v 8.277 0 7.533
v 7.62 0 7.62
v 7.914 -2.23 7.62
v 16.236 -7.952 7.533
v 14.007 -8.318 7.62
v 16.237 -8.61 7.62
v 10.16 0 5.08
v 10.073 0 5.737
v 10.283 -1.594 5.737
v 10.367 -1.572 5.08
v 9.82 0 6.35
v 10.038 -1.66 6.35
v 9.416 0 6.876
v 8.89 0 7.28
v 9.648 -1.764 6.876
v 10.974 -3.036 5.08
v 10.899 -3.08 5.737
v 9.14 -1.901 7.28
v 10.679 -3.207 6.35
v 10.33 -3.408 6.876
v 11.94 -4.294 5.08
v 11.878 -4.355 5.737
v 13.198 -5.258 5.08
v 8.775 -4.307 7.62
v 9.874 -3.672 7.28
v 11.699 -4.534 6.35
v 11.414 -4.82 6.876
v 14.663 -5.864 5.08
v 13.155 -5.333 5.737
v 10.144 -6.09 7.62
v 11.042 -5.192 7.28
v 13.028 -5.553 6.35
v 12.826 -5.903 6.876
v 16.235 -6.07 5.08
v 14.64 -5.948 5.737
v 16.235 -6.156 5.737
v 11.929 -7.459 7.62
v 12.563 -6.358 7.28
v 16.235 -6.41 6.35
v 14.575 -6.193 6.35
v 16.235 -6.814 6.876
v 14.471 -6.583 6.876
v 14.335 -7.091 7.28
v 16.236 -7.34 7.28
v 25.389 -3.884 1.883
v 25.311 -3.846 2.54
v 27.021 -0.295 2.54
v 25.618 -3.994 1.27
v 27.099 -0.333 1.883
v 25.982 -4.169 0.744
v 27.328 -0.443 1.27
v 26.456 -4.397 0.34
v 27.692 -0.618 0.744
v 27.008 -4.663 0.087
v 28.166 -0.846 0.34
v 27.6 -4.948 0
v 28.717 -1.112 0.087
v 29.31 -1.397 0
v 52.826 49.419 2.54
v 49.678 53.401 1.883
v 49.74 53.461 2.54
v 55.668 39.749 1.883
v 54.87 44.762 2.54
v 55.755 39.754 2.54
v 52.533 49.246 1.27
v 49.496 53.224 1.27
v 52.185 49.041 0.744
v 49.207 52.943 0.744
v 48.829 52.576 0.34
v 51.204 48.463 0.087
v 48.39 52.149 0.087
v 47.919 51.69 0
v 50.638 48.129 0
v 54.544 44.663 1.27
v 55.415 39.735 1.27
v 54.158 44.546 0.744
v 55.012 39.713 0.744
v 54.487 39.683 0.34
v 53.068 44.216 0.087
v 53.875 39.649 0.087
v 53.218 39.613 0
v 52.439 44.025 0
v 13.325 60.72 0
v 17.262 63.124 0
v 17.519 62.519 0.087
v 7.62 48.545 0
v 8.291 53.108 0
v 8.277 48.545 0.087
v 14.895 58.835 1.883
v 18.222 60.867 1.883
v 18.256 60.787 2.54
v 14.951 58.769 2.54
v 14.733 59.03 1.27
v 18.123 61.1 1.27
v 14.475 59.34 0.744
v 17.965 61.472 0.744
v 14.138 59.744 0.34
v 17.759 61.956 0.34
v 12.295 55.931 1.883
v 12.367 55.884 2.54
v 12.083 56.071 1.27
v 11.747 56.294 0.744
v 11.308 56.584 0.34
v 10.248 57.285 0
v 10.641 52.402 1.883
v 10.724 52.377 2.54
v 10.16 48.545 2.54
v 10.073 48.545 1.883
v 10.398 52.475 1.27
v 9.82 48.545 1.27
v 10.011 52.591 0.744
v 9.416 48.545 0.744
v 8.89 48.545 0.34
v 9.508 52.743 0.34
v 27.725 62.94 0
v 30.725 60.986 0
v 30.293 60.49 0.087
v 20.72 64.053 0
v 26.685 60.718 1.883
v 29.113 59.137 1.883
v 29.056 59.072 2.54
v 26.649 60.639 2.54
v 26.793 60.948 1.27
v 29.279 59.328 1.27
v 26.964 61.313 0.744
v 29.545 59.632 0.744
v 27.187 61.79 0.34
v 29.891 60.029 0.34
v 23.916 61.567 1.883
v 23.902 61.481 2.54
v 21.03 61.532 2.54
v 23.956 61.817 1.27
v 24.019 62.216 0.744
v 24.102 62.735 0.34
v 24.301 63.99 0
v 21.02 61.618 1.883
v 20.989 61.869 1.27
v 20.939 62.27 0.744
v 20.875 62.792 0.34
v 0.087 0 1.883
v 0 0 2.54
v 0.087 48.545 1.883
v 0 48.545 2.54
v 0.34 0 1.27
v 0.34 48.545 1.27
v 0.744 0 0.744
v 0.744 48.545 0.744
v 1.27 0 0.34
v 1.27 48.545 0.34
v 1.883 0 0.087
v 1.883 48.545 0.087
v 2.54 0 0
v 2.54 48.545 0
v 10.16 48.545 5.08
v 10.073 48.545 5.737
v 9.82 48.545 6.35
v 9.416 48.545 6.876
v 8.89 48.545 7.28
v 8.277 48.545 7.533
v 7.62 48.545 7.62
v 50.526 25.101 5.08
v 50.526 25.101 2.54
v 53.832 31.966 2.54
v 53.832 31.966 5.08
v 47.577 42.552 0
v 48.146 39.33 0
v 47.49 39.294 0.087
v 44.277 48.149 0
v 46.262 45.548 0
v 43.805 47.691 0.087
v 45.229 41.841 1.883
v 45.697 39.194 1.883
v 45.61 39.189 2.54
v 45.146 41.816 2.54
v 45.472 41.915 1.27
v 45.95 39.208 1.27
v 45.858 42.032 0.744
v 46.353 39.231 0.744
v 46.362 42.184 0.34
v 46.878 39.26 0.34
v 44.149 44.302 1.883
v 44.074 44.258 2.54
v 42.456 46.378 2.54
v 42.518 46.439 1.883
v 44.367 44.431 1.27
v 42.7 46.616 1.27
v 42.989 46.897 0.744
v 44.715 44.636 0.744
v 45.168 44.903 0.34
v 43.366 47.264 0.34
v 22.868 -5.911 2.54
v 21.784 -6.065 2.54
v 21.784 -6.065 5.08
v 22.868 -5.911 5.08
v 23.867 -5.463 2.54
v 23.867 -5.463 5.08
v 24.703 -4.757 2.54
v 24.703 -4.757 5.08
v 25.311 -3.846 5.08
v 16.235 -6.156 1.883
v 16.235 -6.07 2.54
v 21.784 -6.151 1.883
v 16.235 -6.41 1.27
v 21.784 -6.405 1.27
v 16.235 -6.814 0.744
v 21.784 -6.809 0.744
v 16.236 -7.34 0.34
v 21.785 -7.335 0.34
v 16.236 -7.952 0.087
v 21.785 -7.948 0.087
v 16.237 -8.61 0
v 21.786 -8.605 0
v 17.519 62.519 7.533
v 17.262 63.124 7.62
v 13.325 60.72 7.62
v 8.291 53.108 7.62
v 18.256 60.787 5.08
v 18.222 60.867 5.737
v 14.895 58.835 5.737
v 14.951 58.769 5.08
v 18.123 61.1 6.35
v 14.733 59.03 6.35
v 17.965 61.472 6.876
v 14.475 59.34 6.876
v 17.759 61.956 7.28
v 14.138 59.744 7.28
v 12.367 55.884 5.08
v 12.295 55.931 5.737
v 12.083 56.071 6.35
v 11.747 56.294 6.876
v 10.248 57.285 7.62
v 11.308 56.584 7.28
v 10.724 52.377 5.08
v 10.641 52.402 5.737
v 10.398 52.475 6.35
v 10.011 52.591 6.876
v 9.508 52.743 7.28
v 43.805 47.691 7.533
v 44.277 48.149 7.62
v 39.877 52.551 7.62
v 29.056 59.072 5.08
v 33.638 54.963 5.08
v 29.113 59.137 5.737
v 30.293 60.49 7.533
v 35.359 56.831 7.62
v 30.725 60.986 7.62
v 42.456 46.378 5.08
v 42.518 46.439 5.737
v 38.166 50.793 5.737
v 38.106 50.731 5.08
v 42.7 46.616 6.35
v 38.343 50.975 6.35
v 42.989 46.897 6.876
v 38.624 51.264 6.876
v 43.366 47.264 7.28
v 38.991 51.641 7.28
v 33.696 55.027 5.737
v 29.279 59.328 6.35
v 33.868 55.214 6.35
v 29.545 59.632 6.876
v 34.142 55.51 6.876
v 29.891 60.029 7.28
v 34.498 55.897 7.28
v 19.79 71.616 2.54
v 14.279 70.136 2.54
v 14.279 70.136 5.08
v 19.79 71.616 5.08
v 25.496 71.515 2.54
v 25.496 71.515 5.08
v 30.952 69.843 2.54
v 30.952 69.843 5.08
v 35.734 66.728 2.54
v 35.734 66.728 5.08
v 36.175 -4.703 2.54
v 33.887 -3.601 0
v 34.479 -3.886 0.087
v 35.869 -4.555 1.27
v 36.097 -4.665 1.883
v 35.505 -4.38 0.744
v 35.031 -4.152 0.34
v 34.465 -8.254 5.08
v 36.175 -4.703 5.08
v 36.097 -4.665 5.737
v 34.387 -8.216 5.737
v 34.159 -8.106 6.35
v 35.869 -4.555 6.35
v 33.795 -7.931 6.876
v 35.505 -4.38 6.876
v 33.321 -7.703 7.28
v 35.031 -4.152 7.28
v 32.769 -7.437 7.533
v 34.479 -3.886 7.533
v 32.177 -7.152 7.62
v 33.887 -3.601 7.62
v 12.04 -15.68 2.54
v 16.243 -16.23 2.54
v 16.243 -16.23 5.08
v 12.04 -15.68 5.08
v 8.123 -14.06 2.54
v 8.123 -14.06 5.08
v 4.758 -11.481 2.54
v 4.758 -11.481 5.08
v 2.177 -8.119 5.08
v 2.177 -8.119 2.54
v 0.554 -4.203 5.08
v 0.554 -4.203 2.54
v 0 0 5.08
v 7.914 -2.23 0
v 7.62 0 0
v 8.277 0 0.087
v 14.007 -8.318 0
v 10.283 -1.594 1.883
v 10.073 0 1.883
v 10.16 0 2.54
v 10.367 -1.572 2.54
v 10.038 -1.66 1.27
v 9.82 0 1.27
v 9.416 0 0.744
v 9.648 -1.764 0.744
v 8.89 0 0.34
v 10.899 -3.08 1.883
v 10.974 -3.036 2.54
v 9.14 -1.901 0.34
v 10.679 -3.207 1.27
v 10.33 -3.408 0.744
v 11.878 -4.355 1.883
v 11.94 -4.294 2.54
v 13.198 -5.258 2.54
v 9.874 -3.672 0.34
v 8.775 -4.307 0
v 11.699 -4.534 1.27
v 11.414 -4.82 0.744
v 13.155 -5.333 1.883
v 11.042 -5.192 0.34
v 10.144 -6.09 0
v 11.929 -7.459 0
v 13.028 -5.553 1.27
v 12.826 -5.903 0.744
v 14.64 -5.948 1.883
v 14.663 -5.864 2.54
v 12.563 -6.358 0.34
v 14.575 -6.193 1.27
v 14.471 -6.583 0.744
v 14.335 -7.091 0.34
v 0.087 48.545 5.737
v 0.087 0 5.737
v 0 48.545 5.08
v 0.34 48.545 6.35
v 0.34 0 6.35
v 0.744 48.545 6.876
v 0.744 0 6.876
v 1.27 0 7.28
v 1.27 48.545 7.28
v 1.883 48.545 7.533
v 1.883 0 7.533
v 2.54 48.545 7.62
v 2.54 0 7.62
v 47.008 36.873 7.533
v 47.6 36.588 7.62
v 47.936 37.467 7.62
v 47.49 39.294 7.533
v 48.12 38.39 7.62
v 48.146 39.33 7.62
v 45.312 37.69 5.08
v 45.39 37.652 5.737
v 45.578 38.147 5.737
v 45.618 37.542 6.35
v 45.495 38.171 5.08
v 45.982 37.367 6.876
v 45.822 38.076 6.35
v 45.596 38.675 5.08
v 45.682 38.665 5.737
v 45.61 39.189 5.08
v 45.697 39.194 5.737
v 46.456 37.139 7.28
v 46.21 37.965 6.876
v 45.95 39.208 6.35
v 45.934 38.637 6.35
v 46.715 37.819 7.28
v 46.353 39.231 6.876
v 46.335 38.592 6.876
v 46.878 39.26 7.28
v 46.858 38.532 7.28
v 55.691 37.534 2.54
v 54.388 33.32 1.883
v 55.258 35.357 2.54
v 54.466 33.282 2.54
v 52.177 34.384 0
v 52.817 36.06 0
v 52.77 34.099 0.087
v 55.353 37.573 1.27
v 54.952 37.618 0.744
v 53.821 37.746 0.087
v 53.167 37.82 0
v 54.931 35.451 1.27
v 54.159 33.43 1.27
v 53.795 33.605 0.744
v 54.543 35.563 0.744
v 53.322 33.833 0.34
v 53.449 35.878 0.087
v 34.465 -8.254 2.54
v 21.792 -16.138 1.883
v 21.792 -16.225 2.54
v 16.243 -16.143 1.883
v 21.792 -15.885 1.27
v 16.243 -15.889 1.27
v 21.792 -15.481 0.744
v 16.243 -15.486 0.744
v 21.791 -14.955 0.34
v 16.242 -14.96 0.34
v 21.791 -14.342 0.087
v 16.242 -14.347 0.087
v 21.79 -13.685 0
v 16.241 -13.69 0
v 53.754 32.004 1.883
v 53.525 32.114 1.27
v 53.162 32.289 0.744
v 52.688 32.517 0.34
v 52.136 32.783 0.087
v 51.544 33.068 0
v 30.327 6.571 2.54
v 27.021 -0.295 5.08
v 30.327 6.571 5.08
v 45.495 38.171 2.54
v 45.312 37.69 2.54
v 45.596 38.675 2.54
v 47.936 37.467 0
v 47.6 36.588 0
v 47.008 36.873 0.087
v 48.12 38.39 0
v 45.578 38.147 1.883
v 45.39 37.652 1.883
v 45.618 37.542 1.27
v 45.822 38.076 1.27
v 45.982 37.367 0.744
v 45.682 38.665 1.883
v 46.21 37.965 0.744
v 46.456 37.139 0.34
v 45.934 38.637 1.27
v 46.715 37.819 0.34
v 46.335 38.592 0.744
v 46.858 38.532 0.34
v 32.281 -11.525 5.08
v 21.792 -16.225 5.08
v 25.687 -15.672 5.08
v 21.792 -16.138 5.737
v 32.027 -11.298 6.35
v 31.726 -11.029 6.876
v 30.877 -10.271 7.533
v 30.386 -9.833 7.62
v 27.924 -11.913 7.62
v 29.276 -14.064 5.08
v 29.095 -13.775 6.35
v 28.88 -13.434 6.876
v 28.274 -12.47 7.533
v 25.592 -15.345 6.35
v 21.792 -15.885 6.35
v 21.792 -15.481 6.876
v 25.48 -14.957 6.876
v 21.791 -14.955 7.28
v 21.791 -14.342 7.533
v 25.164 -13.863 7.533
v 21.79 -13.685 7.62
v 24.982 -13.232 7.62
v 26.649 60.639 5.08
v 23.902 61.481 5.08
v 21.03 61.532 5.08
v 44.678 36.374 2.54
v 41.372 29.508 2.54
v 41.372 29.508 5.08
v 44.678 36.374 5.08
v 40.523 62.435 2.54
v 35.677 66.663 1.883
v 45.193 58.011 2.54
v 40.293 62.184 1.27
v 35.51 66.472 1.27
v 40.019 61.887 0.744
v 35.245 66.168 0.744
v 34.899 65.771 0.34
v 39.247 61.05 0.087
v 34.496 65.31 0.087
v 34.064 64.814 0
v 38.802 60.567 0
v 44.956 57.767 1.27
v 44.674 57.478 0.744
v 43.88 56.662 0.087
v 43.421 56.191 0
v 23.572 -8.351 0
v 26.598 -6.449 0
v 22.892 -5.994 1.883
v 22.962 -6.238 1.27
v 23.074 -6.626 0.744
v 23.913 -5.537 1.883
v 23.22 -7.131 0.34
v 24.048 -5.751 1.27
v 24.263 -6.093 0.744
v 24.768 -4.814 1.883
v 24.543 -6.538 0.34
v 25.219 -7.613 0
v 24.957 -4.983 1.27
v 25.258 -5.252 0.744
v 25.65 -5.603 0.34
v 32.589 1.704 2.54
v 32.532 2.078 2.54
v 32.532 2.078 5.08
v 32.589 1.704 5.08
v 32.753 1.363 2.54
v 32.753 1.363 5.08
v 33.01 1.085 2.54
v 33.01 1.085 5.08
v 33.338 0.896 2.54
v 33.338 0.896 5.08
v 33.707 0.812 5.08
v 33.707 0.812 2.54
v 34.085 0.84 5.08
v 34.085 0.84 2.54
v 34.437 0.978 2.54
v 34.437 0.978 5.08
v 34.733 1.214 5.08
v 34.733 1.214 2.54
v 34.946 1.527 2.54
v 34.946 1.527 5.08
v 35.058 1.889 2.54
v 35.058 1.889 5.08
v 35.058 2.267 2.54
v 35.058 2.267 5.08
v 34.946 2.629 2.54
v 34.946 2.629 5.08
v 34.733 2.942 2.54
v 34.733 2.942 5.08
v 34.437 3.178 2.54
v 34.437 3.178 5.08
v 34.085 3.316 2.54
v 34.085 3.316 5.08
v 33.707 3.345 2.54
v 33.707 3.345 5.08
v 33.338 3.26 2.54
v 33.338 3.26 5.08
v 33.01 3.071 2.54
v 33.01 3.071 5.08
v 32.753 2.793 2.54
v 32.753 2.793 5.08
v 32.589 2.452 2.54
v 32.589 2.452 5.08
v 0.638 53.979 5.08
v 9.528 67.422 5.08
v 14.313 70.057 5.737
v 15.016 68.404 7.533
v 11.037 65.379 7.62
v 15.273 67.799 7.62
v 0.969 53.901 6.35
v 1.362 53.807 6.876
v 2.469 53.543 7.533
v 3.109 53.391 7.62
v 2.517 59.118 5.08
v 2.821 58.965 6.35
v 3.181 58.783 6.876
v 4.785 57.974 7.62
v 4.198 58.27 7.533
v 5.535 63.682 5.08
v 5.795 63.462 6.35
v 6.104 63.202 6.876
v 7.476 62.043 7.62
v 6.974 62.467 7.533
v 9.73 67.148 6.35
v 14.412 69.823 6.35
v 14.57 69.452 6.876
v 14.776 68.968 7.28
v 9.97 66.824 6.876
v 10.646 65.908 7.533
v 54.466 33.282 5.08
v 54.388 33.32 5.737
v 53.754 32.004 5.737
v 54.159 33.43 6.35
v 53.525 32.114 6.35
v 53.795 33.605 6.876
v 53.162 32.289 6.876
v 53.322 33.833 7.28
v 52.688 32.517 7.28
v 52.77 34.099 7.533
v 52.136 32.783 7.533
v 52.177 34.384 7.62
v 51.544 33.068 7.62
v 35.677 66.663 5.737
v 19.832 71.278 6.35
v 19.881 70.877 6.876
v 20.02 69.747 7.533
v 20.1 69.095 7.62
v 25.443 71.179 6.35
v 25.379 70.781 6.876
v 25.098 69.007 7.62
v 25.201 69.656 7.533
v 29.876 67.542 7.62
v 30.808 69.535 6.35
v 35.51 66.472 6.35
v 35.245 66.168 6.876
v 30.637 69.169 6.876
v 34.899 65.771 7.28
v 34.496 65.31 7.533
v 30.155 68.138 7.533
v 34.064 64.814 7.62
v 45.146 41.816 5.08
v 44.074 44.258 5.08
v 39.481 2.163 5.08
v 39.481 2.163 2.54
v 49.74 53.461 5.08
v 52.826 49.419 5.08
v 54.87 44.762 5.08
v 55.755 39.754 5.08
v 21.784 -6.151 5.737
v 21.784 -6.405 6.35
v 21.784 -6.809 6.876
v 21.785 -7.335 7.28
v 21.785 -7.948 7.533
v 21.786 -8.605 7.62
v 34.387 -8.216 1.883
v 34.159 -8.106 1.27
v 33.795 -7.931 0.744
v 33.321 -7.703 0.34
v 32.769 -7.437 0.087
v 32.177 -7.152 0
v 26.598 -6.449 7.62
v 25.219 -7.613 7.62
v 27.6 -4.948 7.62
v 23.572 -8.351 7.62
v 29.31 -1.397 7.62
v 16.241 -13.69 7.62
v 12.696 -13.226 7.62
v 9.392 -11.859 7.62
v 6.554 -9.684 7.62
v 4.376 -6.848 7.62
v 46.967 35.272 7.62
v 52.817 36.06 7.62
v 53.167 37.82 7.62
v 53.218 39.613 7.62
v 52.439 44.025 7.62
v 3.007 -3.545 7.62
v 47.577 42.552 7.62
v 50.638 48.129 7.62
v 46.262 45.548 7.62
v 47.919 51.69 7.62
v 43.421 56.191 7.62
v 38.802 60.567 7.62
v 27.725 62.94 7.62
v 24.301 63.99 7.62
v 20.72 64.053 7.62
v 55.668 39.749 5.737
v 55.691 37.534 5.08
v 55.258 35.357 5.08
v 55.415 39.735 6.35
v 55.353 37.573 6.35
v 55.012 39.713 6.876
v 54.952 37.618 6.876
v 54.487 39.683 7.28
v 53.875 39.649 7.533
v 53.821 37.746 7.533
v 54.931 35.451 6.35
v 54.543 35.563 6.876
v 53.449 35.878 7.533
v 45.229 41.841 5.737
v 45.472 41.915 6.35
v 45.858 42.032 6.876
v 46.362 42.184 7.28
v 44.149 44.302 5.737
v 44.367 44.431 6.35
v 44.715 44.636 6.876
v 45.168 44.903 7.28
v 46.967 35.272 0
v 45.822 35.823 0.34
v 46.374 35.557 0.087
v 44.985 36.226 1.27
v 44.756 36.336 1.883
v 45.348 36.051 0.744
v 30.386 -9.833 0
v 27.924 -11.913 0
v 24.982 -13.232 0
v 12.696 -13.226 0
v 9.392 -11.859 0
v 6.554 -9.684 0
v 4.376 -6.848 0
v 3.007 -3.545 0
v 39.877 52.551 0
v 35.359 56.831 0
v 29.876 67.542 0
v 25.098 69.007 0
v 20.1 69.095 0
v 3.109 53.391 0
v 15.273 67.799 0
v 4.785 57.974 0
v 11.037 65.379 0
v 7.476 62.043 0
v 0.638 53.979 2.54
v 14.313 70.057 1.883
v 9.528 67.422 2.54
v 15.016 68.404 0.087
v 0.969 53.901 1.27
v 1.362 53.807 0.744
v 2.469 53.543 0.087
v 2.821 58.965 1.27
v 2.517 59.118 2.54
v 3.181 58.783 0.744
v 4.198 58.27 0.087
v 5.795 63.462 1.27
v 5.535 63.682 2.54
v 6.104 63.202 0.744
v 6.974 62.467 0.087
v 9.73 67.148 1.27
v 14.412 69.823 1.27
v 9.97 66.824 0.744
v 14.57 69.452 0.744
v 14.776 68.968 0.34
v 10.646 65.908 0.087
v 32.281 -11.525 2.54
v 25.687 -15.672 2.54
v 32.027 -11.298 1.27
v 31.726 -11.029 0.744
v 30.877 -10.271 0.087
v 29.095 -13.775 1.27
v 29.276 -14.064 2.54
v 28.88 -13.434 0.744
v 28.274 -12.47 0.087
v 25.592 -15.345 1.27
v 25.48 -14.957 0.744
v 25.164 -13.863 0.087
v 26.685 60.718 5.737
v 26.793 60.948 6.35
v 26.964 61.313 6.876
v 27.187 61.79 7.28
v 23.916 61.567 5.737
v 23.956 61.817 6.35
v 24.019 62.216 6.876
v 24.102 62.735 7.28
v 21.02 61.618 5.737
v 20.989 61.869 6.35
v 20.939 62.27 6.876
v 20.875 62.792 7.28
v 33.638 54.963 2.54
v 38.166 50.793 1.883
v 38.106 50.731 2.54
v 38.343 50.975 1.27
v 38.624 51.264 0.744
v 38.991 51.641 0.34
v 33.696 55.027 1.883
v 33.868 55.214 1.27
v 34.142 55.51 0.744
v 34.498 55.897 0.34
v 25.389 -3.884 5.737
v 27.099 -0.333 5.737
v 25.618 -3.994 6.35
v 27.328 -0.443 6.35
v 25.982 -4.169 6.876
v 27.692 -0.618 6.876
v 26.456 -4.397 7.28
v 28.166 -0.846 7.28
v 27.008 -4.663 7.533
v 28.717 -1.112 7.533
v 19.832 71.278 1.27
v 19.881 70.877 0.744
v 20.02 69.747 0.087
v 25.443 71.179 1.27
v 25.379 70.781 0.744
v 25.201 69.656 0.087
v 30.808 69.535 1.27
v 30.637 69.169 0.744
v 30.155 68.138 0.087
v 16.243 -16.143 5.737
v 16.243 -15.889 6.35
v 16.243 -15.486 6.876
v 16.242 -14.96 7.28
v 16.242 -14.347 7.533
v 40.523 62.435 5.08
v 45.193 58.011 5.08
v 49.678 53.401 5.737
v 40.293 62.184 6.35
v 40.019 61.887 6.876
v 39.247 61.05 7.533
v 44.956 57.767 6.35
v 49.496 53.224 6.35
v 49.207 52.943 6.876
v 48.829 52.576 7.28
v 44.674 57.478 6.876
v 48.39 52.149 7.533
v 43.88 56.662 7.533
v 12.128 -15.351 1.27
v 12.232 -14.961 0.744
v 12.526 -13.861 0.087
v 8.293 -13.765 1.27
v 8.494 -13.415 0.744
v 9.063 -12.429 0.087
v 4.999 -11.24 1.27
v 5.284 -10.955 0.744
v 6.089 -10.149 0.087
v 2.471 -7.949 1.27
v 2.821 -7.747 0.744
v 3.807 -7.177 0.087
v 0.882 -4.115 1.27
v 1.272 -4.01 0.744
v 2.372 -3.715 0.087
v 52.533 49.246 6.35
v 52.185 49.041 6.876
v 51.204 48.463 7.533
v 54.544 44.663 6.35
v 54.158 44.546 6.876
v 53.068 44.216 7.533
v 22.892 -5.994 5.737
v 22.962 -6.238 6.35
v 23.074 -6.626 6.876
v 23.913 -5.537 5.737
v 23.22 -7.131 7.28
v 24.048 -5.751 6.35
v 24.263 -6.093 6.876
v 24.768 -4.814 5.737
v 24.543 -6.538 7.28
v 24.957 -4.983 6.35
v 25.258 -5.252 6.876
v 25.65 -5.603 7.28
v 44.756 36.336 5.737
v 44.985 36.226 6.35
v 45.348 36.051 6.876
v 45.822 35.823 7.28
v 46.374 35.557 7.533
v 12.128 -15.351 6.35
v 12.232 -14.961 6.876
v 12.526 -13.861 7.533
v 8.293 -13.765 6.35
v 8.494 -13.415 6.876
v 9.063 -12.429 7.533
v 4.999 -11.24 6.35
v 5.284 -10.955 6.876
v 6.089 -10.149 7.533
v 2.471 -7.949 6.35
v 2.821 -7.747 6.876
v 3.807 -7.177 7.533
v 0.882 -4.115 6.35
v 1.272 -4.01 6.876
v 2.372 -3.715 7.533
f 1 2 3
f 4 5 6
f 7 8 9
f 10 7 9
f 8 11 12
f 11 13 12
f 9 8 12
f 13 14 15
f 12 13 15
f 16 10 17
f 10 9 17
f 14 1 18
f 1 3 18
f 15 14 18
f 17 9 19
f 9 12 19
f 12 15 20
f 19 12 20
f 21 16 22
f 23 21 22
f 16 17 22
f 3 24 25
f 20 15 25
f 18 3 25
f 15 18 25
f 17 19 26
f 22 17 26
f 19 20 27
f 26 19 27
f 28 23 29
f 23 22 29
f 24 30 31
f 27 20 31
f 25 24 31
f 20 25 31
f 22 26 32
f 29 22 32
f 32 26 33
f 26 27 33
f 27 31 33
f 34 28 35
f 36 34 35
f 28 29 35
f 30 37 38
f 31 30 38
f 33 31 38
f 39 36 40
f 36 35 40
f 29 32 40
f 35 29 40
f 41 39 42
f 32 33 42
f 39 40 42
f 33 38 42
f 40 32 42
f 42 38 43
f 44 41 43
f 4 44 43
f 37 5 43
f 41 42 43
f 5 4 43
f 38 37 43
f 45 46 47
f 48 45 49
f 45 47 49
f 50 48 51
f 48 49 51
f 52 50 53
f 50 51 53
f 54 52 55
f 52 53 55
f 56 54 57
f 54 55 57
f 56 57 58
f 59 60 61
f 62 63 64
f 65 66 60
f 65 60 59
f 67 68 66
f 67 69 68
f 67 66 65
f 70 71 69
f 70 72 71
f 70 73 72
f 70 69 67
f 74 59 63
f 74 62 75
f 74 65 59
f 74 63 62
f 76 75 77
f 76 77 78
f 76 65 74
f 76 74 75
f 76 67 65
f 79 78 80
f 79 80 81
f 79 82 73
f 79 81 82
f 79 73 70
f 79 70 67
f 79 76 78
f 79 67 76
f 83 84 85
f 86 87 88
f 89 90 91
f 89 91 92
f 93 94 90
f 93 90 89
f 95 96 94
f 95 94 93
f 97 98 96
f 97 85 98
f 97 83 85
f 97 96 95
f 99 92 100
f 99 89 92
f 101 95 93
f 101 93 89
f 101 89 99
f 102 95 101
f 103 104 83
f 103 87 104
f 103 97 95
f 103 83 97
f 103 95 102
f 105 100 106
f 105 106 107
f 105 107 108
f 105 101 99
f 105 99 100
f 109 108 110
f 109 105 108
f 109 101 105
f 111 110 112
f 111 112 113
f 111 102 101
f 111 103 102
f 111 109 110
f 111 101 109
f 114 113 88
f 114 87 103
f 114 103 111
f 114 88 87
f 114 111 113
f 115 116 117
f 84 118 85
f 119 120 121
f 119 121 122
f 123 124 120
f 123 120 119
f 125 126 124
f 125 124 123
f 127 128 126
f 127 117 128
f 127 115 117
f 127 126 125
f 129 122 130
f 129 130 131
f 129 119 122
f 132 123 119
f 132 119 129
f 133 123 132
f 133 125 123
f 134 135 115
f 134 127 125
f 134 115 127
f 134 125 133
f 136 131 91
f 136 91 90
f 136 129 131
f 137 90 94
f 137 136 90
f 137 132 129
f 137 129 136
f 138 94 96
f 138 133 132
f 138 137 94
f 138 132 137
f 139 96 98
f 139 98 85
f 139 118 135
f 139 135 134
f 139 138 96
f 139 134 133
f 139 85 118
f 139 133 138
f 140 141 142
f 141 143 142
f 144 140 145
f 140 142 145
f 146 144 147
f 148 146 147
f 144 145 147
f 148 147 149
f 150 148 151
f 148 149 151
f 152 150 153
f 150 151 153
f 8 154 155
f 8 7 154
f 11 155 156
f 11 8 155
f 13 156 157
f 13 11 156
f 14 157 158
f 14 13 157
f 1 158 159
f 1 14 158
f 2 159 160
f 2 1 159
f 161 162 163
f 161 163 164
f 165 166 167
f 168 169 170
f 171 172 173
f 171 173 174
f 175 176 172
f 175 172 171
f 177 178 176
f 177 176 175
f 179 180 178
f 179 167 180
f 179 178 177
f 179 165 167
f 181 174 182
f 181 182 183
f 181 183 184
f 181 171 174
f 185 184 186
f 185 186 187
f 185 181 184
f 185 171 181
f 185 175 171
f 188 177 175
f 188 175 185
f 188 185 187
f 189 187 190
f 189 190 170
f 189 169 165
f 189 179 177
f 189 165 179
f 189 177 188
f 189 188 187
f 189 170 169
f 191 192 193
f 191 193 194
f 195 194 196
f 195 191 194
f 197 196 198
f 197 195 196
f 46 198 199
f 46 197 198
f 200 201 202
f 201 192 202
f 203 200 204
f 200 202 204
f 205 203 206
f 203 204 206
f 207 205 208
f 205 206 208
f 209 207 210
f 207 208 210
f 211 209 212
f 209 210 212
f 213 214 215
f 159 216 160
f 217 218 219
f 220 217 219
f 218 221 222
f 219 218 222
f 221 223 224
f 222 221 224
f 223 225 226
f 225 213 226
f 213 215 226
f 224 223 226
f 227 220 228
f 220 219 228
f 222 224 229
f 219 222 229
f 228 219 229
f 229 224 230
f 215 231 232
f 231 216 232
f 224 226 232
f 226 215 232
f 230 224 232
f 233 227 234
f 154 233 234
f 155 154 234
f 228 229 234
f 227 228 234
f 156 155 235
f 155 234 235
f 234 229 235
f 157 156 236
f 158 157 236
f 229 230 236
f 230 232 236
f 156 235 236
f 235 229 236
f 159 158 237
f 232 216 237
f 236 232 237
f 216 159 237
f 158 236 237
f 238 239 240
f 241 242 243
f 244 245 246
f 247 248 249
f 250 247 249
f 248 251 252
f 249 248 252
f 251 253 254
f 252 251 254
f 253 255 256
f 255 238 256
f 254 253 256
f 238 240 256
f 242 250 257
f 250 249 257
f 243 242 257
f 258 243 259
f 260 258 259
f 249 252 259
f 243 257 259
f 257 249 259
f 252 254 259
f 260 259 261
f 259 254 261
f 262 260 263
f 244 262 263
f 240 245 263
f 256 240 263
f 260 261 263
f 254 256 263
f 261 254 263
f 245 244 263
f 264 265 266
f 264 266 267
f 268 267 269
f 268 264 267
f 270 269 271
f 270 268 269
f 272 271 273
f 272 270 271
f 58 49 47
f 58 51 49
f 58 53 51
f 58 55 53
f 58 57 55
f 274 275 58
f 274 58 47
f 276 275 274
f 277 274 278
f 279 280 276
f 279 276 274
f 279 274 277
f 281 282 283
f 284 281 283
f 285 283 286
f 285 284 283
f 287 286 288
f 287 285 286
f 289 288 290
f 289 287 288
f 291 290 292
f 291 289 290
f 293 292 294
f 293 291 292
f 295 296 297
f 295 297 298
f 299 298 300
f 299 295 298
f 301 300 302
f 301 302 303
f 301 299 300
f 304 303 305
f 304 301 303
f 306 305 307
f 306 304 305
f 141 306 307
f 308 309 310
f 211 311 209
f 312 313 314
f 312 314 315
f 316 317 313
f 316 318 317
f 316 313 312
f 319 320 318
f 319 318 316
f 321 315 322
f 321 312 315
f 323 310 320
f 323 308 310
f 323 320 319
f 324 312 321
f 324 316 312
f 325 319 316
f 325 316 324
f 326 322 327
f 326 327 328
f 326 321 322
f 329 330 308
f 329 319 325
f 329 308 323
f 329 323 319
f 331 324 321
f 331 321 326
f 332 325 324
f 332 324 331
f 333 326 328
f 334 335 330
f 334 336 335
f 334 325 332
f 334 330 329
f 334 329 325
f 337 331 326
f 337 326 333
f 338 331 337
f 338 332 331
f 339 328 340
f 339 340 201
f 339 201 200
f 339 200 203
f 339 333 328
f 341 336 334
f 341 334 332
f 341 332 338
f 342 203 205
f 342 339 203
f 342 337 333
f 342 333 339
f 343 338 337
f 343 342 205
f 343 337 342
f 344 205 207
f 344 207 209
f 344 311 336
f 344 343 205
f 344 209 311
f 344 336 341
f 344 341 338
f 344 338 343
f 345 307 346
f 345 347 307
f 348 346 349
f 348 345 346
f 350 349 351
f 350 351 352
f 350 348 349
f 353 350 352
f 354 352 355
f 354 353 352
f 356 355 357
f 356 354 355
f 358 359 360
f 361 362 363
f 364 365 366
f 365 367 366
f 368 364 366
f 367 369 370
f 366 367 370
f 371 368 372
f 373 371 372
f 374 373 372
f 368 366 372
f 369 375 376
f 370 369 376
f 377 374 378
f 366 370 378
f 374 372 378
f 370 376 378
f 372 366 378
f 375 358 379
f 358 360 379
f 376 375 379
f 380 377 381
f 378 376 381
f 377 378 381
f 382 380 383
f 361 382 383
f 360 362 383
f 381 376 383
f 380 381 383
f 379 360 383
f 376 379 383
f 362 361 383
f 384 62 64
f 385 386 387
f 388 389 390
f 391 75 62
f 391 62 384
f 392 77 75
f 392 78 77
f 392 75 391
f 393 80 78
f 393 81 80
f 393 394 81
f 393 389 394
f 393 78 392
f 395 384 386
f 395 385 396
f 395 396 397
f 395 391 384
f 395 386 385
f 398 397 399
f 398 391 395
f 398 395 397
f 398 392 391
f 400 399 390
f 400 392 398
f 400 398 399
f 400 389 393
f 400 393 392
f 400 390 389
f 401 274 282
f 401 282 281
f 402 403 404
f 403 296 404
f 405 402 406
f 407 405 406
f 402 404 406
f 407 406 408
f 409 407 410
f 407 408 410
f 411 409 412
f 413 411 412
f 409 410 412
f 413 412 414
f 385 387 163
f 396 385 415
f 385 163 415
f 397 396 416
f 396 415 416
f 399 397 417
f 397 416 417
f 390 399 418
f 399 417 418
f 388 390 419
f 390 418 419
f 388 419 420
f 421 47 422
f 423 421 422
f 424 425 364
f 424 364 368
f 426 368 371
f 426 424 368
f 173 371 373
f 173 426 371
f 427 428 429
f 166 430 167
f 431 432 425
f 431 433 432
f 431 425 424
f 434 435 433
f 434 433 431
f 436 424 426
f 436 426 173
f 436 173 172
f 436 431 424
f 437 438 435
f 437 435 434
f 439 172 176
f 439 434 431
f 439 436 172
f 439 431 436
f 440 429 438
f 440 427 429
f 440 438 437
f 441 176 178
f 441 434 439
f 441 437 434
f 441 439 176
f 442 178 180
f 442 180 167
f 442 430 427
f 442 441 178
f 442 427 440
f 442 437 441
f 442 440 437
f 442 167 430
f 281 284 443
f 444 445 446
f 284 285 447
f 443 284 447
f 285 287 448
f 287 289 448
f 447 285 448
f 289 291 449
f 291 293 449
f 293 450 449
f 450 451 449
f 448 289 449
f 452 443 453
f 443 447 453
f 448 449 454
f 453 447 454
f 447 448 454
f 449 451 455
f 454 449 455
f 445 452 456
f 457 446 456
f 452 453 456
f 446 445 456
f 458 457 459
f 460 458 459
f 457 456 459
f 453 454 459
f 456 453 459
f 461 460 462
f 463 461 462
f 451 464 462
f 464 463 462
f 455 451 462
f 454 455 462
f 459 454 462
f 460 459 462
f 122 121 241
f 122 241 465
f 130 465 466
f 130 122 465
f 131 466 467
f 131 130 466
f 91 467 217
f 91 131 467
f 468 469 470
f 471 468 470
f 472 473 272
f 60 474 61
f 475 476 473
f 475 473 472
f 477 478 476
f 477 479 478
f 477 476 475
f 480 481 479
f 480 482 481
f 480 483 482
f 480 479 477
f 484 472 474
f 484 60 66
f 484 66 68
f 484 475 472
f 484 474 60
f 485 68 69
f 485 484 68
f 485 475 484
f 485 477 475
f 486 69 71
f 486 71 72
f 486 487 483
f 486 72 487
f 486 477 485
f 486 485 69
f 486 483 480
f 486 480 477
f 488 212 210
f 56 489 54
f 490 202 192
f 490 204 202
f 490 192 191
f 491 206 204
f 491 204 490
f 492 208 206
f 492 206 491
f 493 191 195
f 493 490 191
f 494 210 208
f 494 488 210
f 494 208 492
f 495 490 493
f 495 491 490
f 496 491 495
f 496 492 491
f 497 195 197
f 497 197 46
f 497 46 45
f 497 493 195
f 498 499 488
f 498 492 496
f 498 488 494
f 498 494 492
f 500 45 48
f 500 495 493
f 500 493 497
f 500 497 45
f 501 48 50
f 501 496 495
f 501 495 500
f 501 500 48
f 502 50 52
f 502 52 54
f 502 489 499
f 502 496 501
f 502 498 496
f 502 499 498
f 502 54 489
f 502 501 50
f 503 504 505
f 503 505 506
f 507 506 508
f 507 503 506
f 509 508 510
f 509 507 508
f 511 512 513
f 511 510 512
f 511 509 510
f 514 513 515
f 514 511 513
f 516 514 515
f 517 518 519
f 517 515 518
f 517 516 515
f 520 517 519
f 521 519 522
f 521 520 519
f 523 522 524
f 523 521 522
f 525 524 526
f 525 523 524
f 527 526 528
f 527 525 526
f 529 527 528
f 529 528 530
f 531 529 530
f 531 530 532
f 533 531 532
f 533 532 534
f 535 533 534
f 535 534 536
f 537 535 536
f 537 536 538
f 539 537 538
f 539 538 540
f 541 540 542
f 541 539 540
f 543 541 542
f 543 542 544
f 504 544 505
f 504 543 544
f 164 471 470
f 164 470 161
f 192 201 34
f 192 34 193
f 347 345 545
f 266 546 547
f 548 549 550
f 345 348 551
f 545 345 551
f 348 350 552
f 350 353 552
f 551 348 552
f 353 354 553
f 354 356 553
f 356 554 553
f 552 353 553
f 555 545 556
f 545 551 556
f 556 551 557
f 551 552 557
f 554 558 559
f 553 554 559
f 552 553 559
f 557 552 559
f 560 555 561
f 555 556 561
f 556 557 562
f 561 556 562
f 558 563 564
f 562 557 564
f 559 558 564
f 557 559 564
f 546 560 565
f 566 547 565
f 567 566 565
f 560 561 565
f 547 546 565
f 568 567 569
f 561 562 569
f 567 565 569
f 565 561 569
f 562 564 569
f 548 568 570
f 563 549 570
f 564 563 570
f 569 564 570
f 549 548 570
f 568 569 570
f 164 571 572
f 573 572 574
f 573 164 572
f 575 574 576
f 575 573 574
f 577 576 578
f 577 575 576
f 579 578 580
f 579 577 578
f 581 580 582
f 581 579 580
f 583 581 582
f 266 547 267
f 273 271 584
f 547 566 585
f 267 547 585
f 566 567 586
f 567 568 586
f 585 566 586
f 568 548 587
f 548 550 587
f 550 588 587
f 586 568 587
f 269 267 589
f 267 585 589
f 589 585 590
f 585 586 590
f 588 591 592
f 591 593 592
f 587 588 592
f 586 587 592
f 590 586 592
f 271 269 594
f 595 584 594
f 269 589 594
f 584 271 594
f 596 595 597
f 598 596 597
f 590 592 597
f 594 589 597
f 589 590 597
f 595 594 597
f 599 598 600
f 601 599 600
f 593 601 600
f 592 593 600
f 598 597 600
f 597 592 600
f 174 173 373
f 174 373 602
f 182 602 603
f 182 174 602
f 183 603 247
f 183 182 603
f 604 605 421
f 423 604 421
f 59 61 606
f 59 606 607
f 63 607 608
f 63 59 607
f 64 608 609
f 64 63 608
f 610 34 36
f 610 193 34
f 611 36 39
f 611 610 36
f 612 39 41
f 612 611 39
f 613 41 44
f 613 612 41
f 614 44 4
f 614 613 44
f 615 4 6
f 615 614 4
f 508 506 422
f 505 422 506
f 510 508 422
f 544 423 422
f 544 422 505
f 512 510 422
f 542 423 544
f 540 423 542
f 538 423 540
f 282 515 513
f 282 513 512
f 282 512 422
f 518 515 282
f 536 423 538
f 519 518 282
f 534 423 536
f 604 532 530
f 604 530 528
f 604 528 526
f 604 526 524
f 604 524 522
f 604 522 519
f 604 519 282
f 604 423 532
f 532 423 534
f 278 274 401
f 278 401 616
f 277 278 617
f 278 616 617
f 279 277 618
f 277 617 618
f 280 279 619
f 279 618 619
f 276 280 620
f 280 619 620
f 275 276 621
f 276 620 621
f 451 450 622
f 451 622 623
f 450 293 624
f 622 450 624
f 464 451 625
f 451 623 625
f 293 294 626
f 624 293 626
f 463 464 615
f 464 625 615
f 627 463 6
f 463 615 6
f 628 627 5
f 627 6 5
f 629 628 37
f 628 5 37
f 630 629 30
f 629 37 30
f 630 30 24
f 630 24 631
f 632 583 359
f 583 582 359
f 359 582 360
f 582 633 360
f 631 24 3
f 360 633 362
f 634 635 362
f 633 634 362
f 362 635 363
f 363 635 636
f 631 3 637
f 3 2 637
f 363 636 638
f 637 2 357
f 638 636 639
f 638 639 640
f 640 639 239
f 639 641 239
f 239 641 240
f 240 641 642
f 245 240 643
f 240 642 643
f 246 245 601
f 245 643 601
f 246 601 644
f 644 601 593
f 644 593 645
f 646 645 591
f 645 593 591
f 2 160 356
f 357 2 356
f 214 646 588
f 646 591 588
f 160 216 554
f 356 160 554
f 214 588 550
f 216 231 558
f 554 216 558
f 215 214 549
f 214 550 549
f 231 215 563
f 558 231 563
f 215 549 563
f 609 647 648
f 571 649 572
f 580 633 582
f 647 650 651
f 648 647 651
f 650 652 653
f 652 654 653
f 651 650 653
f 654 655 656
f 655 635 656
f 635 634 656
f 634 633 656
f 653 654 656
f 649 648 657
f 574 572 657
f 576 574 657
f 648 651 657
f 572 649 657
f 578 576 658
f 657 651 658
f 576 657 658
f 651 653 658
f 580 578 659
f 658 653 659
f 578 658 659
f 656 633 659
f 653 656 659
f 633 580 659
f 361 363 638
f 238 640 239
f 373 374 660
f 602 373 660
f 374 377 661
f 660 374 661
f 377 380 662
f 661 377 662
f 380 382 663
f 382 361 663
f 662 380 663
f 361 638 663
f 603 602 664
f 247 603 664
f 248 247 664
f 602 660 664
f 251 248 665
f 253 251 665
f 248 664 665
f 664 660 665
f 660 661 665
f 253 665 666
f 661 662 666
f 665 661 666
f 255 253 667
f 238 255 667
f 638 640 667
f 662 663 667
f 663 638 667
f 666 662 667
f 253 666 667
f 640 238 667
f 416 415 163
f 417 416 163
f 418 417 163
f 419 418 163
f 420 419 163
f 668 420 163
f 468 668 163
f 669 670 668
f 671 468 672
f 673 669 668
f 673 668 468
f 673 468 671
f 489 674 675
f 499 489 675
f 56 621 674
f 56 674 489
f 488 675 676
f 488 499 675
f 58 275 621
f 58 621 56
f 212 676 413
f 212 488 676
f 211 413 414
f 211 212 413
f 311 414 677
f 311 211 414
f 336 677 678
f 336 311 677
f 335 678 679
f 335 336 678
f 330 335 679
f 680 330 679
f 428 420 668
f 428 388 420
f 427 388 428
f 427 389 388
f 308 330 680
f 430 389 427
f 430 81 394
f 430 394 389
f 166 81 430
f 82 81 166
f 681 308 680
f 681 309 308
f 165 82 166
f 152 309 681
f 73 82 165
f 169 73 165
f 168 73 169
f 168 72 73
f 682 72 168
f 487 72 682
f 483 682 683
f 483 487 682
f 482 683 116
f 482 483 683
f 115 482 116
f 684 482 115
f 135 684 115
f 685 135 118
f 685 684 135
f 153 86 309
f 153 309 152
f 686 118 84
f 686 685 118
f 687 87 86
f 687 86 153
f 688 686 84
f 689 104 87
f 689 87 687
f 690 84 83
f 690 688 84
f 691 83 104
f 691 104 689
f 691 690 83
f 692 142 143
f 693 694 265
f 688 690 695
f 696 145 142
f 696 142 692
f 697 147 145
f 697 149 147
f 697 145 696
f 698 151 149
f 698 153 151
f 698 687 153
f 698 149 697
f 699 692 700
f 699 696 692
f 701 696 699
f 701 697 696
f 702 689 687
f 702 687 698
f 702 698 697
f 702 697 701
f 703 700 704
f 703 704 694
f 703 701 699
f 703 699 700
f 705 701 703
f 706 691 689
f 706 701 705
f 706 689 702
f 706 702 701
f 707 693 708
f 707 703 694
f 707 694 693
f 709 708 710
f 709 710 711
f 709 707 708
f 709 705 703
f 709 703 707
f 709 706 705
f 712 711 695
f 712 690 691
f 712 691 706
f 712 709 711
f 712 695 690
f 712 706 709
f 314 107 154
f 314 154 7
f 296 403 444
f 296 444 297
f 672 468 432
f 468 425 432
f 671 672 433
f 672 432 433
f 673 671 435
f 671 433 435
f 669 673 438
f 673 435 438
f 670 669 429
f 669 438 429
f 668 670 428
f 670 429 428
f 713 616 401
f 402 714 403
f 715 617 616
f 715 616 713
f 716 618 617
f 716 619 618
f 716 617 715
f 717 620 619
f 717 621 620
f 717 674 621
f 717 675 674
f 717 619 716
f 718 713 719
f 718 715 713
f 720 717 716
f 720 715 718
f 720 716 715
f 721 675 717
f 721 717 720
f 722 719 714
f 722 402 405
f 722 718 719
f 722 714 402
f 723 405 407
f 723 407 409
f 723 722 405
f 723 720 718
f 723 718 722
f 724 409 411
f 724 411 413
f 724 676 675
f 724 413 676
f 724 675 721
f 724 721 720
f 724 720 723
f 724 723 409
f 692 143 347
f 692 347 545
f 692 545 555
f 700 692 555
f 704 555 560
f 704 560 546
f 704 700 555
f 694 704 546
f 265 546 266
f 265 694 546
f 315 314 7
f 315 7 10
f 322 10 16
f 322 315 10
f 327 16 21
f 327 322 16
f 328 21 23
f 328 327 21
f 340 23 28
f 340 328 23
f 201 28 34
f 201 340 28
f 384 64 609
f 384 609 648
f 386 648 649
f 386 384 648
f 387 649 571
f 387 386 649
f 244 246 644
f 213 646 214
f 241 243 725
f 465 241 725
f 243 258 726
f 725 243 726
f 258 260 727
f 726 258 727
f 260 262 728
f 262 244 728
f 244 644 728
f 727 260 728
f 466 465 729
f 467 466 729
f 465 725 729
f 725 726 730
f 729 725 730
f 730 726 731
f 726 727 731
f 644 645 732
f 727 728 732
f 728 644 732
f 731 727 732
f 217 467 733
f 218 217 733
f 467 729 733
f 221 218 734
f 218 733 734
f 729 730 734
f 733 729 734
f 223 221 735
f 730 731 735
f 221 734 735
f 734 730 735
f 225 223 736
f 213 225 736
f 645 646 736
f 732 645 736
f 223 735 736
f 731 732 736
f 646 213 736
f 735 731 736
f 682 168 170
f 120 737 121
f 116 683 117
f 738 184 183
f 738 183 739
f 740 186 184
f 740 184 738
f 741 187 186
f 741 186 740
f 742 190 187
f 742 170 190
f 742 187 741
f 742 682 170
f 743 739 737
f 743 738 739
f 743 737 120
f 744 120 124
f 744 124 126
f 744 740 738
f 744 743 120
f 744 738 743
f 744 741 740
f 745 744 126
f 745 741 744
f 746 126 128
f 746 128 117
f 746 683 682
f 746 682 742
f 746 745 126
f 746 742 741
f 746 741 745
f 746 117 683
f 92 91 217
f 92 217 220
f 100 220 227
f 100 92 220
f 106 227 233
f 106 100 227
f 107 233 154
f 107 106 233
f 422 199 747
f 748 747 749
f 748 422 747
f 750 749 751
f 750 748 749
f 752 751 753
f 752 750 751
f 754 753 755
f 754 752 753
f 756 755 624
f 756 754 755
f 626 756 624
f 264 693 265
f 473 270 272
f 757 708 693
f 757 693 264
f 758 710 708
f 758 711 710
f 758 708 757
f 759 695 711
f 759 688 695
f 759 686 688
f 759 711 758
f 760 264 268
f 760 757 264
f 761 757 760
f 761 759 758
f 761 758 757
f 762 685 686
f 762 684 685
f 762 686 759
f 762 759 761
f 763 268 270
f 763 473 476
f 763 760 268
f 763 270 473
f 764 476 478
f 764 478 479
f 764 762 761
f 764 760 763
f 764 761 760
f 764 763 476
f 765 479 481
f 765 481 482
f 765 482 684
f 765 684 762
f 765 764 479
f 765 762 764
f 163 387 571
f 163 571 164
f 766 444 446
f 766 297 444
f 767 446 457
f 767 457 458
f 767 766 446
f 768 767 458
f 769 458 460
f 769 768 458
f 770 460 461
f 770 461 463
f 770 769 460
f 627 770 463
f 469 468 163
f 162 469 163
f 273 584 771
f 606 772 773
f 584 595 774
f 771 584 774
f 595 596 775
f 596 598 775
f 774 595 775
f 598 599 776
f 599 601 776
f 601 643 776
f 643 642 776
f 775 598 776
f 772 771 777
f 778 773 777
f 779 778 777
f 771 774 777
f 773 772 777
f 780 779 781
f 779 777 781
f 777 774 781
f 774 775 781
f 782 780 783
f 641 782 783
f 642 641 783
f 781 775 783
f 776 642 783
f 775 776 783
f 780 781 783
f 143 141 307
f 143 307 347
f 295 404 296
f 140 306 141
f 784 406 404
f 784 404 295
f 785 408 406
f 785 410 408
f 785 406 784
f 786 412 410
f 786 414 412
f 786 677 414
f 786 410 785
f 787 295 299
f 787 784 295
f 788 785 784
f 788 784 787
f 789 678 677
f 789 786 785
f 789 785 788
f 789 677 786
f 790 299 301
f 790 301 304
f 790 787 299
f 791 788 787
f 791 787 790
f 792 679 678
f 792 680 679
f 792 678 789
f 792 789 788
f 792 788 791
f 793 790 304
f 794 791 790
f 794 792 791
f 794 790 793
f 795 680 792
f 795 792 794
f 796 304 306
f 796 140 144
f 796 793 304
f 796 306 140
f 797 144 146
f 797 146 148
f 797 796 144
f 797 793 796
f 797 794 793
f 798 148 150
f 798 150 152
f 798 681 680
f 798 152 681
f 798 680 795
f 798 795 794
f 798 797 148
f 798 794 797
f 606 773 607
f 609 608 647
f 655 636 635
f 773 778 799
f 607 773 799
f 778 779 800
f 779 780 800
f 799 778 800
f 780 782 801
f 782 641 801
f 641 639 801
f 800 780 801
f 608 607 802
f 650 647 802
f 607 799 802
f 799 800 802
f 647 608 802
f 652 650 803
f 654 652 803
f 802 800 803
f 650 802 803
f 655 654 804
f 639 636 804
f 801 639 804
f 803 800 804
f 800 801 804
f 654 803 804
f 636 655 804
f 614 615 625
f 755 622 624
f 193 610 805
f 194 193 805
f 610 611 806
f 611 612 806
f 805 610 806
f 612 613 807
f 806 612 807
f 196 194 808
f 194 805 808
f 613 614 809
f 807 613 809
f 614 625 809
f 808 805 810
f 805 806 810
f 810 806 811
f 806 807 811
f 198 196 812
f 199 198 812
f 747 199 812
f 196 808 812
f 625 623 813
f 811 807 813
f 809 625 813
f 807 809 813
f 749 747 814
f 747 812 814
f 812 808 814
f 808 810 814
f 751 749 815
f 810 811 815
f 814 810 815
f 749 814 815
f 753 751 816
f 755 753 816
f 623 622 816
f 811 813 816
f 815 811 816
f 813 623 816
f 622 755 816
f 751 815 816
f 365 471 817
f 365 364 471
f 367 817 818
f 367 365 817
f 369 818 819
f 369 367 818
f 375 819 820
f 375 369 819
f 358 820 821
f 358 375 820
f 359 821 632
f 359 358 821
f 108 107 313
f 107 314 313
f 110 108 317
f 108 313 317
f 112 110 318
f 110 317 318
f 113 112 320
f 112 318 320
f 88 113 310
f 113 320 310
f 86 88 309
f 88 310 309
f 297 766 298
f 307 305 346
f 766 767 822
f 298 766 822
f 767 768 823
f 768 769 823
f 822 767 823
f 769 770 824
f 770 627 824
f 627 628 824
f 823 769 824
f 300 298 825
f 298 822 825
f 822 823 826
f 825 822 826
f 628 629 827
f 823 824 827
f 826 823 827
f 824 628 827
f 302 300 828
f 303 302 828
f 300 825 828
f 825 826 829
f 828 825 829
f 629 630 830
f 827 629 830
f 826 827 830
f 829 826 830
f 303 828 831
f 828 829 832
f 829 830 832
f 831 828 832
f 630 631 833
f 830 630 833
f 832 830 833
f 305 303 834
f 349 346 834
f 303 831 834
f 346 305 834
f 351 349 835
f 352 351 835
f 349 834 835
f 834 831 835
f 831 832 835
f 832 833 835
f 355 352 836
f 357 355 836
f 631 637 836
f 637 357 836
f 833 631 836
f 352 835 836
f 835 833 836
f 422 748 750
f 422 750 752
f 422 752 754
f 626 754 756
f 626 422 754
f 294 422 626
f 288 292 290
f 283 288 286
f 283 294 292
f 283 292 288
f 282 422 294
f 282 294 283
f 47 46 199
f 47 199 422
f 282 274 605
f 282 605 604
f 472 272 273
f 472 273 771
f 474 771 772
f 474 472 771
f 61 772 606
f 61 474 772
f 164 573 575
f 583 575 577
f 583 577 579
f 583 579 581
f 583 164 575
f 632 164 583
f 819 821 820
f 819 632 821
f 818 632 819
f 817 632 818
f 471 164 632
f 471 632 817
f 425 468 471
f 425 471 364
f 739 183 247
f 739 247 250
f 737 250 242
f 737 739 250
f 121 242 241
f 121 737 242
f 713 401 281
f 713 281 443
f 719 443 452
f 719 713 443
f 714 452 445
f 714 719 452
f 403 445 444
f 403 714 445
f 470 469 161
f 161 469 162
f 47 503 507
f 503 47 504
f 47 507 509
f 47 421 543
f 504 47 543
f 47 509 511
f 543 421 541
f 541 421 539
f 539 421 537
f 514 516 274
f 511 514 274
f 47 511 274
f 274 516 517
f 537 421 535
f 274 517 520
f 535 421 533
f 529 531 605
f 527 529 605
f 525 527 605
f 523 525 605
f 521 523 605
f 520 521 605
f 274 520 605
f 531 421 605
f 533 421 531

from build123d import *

# Parameters (mm, degrees)
BOSS_EXTRUDE1_DEPTH     = 7.62
FILLET1_R               = 2.54
SKETCH4_W               = 10.16
SKETCH4_H               = 2.54
BOSS_EXTRUDE2_DEPTH     = 40.698655059
CUT_EXTRUDE1_DEPTH      = 92.035139481
CUT_EXTRUDE1_DEPTH_BACK = 92.035139481
SKETCH7_R               = 1.27
CUT_EXTRUDE2_DEPTH      = 92.212140759


with BuildPart() as part:
    # Sketch2 → Boss-Extrude1 (new body)
    with BuildSketch(Plane.XY):
        with BuildLine():
            Line((557.368573337, 914.592873905), (556.734884655, 913.276848696))
            Line((556.734884655, 913.276848696), (547.580835245, 917.684680294))
            Line((547.580835245, 917.684680294), (548.214523926, 919.000705503))
            ThreePointArc((548.214523926, 919.000705503), (548.458818056, 919.731374997), (548.513066645, 920.499889552))
            ThreePointArc((548.513066645, 920.499889552), (547.585939227, 924.379743345), (545.358485968, 927.689015574))
            ThreePointArc((545.358485968, 927.689015574), (538.788952643, 934.173311823), (531.958551893, 940.382216038))
            ThreePointArc((531.958551893, 940.382216038), (526.80512603, 942.791823737), (521.15870091, 942.097640216))
            ThreePointArc((521.15870091, 942.097640216), (515.269866914, 937.194322522), (513.062812413, 929.85608018))
            Line((513.062812413, 929.85608018), (513.062812413, 881.310664403))
            ThreePointArc((513.062812413, 881.310664403), (514.84238247, 877.01697918), (519.13757646, 875.241053792))
            Line((519.13757646, 875.241053792), (524.686345009, 875.245763006))
            ThreePointArc((524.686345009, 875.245763006), (526.769666342, 875.847420281), (528.214212618, 877.464672677))
            Line((528.214212618, 877.464672677), (529.924061844, 881.015635083))
            Line((529.924061844, 881.015635083), (539.078111254, 876.607803485))
            Line((539.078111254, 876.607803485), (537.368262028, 873.056841079))
            ThreePointArc((537.368262028, 873.056841079), (532.178962974, 867.247123196), (524.69496775, 865.085766665))
            Line((524.69496775, 865.085766665), (519.146199201, 865.081057451))
            ThreePointArc((519.146199201, 865.081057451), (507.66122682, 869.82972633), (502.902812413, 881.310664403))
            Line((502.902812413, 881.310664403), (502.902812413, 929.85608018))
            ThreePointArc((502.902812413, 929.85608018), (506.79547726, 942.798813577), (517.181834766, 951.446978999))
            ThreePointArc((517.181834766, 951.446978999), (528.398937465, 952.826033478), (538.636655301, 948.039143286))
            ThreePointArc((538.636655301, 948.039143286), (545.776010677, 941.549396152), (552.642698999, 934.771800374))
            ThreePointArc((552.642698999, 934.771800374), (556.88965456, 928.462203511), (558.657354478, 921.064711969))
            ThreePointArc((558.657354478, 921.064711969), (558.423168364, 917.747106133), (557.368573337, 914.592873905))
        make_face()
    extrude(amount=BOSS_EXTRUDE1_DEPTH)


with BuildPart() as part_1:
    # Body-Move/Copy1: moved
    add(part.part.moved(Location((-502.902812413, -881.310664403, 0))))

    # Fillet1
    fillet1_edges = [part_1.edges().sort_by_distance(p)[0] for p in [
        (42.873198264, 60.238731749, 7.62),
        (53.986842147, 47.151539108, 7.62),
        (55.520355951, 36.43644173, 7.62),
        (54.148916583, 32.624196898, 7.62),
        (0, 24.272707889, 0),
        (4.758414407, -11.480938073, 0),
        (19.017771063, -16.227252345, 0),
        (29.276150561, -14.063541207, 0),
        (35.320374228, -6.478342121, 0),
        (26.166324818, -2.070510523, 0),
        (23.86685393, -5.463244122, 0),
        (19.009148321, -6.067256004, 0),
        (11.939570057, -4.293685223, 0),
        (10.16, 24.272707889, 0),
        (12.367054501, 55.883658119, 0),
        (44.994867173, 37.032028495, 7.62),
        (23.902313617, 61.481159334, 0),
        (35.88614023, 52.86264742, 0),
        (44.683126814, 43.069078942, 0),
        (45.556005643, 38.420710594, 0),
        (44.994867173, 37.032028495, 0),
        (54.148916583, 32.624196898, 0),
        (45.556005643, 38.420710594, 7.62),
        (55.520355951, 36.43644173, 0),
        (53.986842147, 47.151539108, 0),
        (42.873198264, 60.238731749, 0),
        (25.496125052, 71.515369074, 0),
        (3.892664847, 61.488149174, 0),
        (44.683126814, 43.069078942, 7.62),
        (35.88614023, 52.86264742, 7.62),
        (23.902313617, 61.481159334, 7.62),
        (3.892664847, 61.488149174, 7.62),
        (12.367054501, 55.883658119, 7.62),
        (10.16, 24.272707889, 7.62),
        (11.939570057, -4.293685223, 7.62),
        (19.009148321, -6.067256004, 7.62),
        (23.86685393, -5.463244122, 7.62),
        (26.166324818, -2.070510523, 7.62),
        (35.320374228, -6.478342121, 7.62),
        (29.276150561, -14.063541207, 7.62),
        (19.017771063, -16.227252345, 7.62),
        (25.496125052, 71.515369074, 7.62),
        (4.758414407, -11.480938073, 7.62),
        (0, 24.272707889, 7.62),
    ]]
    fillet(fillet1_edges, radius=FILLET1_R)

    # Sketch4 → Boss-Extrude2 (add)
    with BuildSketch(Plane(origin=(22.627352506, 46.991791376, 0), x_dir=(0.9009891151809732, -0.433841692700698, 0), z_dir=(-0.43384169270069806, -0.9009891151809734, 0))):
        with Locations((29.553847635, 3.81)):
            Rectangle(SKETCH4_W, SKETCH4_H)
    extrude(amount=BOSS_EXTRUDE2_DEPTH)

    # Sketch5 → Cut-Extrude1 (cut, two sides: drawn at the far end of the back side and taken through both)
    with BuildSketch(Plane.XY.offset(5.08).offset(-CUT_EXTRUDE1_DEPTH_BACK)):
        Polygon((41.372149134, 29.508478833), (50.526198544, 25.100647236), (39.48117254, 2.16267614), (30.327123129, 6.570507738), align=None)
    extrude(amount=CUT_EXTRUDE1_DEPTH + CUT_EXTRUDE1_DEPTH_BACK, mode=Mode.SUBTRACT)

    # Sketch7 → Cut-Extrude2 (cut, through all)
    with BuildSketch(Plane.XY):
        with Locations(Location((33.802189935, 2.078079586, 0), (0, 0, 180))):
            Circle(SKETCH7_R)
    extrude(amount=CUT_EXTRUDE2_DEPTH, mode=Mode.SUBTRACT)


solid = part_1.part
